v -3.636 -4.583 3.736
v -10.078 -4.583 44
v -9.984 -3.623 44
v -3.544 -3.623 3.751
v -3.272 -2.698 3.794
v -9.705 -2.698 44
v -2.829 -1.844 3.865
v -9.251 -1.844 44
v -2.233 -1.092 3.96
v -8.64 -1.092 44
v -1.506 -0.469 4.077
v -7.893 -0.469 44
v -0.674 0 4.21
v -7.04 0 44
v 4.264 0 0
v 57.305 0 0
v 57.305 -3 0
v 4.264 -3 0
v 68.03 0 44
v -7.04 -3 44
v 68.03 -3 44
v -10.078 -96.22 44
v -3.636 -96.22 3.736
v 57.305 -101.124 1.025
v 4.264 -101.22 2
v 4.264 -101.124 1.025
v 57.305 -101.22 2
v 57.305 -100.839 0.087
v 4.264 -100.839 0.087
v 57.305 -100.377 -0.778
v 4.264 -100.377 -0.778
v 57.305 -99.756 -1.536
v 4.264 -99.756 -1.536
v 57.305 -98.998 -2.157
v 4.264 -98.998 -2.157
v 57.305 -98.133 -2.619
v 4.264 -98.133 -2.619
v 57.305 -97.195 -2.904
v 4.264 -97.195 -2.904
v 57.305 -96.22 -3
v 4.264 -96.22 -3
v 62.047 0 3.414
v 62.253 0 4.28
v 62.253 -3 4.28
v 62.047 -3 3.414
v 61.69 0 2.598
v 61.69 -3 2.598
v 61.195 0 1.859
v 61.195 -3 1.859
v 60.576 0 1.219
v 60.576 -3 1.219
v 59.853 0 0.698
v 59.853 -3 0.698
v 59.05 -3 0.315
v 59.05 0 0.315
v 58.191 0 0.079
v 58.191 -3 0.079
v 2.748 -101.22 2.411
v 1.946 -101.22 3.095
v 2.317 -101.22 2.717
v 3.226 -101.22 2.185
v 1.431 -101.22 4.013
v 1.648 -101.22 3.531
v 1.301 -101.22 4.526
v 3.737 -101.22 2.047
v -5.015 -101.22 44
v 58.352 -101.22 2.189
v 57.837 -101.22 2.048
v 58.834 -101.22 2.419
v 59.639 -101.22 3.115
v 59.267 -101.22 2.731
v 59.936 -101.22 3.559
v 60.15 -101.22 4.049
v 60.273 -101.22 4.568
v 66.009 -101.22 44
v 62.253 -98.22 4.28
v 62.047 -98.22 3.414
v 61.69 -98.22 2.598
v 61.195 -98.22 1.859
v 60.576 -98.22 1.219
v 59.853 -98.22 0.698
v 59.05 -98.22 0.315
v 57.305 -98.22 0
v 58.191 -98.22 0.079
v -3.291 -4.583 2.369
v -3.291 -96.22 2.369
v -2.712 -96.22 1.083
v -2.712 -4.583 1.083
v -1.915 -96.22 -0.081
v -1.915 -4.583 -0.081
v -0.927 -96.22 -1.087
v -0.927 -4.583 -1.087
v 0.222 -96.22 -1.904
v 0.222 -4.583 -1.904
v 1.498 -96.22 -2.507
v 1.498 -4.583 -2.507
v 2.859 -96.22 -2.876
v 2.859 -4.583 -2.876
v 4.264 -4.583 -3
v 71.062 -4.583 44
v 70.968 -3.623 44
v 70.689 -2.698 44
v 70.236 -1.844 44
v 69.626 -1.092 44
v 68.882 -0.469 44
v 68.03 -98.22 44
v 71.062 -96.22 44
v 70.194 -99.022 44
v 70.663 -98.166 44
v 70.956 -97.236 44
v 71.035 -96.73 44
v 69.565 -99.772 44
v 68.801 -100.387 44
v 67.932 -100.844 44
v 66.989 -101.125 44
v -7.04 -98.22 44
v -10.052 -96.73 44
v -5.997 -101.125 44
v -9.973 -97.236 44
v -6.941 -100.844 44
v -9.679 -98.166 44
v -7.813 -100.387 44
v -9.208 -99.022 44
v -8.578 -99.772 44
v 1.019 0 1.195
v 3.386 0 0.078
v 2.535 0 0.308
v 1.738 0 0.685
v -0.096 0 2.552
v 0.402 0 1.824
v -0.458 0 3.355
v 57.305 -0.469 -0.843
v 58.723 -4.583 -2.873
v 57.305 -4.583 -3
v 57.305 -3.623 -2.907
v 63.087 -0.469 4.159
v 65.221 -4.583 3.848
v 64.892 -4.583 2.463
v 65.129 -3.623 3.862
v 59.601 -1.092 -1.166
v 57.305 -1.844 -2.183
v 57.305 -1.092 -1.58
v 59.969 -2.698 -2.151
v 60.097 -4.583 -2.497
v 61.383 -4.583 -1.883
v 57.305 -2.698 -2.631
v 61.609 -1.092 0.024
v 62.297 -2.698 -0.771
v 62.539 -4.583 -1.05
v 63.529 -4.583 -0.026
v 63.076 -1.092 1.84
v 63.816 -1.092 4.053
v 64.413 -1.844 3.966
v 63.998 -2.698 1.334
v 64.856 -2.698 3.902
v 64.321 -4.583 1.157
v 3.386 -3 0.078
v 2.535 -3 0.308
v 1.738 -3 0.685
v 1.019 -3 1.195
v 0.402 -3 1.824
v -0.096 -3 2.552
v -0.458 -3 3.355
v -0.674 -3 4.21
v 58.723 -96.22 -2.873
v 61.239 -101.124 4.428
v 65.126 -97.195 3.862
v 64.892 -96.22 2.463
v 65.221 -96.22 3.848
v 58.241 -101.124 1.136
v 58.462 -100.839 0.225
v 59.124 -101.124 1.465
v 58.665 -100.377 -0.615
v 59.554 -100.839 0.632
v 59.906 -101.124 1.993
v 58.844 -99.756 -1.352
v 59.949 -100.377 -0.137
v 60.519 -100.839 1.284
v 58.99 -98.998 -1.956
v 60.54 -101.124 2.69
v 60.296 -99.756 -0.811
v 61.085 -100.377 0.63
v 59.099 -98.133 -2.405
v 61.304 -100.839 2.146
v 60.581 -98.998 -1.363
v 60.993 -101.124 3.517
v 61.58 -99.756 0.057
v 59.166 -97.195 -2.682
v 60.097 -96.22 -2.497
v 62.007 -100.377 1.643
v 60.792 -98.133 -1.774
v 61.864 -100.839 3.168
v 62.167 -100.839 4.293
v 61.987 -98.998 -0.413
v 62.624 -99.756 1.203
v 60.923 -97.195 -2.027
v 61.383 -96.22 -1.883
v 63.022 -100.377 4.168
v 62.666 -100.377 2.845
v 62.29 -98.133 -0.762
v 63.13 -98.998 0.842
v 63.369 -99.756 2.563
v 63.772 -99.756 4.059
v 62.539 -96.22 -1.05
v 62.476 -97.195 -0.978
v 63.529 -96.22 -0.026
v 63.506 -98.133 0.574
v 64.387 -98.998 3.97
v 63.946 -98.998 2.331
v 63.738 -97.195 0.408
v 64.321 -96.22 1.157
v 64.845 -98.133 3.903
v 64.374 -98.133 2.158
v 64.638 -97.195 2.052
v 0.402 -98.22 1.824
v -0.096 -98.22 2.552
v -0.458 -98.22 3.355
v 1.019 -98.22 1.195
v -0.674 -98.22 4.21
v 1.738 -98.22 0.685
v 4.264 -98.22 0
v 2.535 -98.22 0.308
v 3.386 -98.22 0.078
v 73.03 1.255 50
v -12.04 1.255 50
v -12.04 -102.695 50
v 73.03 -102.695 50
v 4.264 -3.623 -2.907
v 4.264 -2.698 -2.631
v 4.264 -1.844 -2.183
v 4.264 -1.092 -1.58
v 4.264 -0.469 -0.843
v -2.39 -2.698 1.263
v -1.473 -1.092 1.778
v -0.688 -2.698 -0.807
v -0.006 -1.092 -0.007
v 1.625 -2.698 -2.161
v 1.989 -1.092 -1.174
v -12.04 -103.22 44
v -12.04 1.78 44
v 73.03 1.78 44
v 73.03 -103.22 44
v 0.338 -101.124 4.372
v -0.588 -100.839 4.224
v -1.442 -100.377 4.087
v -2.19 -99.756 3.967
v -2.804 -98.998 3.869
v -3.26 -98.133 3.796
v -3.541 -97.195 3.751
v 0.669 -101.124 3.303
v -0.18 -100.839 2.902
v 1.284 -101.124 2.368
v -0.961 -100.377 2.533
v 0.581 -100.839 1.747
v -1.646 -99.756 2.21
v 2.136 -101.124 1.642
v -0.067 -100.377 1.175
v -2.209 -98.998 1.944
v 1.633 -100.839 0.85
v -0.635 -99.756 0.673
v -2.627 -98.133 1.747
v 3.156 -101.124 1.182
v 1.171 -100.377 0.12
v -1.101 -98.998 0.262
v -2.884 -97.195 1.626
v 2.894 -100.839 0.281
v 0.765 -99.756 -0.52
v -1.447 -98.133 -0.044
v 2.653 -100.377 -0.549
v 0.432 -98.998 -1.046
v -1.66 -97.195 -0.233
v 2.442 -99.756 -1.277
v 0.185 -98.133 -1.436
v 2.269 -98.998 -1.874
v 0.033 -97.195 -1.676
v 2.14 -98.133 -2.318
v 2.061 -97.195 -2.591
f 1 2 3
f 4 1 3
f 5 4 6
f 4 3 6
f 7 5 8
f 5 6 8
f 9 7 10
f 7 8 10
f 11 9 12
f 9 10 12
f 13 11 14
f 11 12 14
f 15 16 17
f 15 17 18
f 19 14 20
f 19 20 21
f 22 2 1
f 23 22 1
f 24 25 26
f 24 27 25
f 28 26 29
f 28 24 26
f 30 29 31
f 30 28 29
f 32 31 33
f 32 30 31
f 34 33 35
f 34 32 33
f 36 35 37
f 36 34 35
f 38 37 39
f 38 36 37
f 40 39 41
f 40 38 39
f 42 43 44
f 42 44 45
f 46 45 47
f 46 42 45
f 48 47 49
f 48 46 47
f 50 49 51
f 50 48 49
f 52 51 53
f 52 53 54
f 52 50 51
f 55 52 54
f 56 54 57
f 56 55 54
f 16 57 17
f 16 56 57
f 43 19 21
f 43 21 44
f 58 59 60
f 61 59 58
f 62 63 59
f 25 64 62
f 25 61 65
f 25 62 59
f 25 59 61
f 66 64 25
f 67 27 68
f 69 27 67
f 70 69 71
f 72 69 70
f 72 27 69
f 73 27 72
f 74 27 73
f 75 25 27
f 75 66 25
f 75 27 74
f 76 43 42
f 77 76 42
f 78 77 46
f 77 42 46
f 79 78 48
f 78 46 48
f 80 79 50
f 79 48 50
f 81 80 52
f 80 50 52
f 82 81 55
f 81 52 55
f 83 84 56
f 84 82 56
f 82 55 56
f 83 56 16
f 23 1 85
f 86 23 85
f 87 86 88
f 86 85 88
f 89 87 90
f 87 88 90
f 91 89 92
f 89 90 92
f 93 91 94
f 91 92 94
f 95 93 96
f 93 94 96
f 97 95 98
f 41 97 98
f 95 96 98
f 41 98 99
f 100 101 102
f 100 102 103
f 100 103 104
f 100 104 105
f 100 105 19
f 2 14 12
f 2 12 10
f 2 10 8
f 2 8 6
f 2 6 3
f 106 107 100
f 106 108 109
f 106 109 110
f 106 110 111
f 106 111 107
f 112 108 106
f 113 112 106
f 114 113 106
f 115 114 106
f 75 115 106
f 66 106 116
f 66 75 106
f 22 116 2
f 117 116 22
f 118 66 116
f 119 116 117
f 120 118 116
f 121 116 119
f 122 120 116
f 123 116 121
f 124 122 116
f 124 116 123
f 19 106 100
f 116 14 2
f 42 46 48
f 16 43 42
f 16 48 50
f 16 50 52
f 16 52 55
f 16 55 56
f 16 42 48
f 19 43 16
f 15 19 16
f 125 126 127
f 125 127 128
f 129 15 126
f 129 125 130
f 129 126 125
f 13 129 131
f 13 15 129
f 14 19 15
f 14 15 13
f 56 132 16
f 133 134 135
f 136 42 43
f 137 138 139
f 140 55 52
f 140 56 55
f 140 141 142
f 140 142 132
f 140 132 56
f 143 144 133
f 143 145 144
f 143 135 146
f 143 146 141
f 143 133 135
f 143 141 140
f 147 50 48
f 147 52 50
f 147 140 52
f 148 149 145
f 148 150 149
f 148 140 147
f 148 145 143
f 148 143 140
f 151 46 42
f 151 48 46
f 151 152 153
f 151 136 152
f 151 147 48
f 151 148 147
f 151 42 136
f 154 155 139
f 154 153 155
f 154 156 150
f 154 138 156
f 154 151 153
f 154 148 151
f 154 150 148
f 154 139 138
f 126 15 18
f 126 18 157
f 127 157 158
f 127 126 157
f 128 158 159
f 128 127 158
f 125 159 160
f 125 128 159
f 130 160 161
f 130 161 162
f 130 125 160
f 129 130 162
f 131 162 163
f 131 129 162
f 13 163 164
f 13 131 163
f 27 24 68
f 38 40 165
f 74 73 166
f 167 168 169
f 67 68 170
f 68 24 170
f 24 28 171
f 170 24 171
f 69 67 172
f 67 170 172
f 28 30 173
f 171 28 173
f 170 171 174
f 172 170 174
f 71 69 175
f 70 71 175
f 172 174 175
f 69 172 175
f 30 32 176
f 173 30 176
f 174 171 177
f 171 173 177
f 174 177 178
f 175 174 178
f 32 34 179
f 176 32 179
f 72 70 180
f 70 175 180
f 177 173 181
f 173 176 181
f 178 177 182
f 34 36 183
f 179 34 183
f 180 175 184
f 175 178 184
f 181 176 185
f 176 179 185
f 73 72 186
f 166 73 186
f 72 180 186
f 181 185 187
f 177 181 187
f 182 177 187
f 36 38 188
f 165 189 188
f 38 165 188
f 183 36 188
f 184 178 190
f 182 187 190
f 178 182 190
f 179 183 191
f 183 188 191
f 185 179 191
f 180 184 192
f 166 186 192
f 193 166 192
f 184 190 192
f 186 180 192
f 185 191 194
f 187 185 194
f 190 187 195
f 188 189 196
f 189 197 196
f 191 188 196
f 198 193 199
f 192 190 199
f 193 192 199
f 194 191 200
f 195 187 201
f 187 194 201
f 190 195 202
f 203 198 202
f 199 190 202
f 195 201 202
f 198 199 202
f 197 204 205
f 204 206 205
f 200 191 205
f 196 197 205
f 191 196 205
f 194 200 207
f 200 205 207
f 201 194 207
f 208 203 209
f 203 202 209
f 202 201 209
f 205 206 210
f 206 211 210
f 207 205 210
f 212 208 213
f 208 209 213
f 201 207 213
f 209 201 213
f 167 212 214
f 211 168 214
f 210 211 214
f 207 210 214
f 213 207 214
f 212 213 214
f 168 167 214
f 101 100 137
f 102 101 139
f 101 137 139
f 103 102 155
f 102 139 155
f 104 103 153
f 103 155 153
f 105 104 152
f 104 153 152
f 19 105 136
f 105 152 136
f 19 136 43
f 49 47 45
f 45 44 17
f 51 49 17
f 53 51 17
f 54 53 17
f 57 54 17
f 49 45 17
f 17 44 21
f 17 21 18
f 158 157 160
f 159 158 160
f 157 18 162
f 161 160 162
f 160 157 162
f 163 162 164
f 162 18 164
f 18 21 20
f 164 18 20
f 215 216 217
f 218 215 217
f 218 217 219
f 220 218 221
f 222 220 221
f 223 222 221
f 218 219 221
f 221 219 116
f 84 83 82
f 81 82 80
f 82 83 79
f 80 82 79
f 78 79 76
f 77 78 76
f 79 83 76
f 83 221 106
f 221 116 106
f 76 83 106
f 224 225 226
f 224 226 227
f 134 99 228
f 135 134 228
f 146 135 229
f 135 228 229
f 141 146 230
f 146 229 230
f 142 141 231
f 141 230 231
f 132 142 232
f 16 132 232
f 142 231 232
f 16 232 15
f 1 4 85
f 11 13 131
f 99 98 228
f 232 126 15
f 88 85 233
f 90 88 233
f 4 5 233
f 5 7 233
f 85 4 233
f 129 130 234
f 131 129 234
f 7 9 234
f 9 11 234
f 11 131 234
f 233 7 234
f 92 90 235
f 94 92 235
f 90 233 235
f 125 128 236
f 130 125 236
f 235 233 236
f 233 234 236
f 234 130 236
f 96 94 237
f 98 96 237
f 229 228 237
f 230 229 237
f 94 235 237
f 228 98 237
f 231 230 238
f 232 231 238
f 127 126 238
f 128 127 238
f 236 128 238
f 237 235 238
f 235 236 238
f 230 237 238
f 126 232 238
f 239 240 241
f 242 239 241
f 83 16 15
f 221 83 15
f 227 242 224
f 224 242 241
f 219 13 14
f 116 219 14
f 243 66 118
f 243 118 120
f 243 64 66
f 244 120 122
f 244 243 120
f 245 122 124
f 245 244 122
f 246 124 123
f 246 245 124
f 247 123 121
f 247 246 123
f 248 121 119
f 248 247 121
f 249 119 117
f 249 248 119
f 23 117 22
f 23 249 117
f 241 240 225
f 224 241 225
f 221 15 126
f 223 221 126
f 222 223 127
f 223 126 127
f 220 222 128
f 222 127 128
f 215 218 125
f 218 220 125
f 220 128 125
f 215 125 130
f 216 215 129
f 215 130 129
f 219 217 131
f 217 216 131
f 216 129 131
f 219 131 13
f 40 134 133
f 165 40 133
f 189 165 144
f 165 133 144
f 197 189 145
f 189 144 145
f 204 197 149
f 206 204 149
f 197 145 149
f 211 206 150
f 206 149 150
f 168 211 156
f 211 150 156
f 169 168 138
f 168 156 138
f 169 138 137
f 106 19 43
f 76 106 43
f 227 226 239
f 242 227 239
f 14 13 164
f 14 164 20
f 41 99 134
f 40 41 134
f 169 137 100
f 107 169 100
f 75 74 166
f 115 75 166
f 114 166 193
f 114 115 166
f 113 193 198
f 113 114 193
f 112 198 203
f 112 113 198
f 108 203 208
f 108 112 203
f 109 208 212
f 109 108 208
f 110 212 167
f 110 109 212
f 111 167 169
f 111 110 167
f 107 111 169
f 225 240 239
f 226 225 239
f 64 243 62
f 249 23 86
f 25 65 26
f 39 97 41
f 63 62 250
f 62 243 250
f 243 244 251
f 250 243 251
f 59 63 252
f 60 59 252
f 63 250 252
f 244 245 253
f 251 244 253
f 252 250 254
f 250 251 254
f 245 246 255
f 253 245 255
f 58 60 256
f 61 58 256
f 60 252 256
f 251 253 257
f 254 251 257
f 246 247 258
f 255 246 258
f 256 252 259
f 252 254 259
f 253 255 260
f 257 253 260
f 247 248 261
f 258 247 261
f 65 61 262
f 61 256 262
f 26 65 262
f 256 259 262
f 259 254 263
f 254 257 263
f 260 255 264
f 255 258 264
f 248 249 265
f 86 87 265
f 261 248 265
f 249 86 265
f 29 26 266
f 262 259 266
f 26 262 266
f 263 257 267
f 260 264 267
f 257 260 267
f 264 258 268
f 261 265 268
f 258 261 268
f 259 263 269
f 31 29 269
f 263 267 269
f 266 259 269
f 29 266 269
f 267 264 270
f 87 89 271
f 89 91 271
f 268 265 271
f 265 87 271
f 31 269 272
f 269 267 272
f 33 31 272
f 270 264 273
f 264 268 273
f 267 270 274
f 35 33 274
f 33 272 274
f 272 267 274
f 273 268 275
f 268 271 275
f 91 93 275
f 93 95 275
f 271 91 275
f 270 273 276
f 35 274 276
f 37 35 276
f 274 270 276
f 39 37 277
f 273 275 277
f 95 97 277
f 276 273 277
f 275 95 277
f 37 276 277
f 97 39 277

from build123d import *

# Parameters (mm, degrees)
F1_DEPTH     = 101.22
F3_DEPTH     = 3
F5_DEPTH     = 3
F6_T1_DEPTH  = 52.0304782215
F6_T3_DEPTH  = 53.0410614462
F6_T5_DEPTH  = 52.232484609
F6_T8_ANGLE  = 81.7241071729
F6_T10_ANGLE = 80.9097230792
F7_R         = 5
F9_DEPTH     = 6
F11_DEPTH    = 111.14


# Not quite as in the source:
# - a fillet or chamfer that OpenCascade refuses, or shapes differently, is made with other operations: its cross-section is extruded or revolved along the edge and cut away or added


with BuildPart() as f1:
    # F0 (on Front) → F1 (new body)
    with BuildSketch(Plane.XZ):
        with BuildLine():
            Line((57.3046570067, 0), (4.2635955605, 0))
            ThreePointArc((4.2635955605, 0), (1.0193516214, 1.1954131284), (-0.6736075991, 4.2100474945))
            Line((-0.6736075991, 4.2100474945), (-7.04, 44))
            Line((-7.04, 44), (-10.0781573363, 44))
            Line((-10.0781573363, 44), (-3.6359294949, 3.7360759911))
            ThreePointArc((-3.6359294949, 3.7360759911), (-0.927194742, -1.0873389946), (4.2635955605, -3))
            Line((4.2635955605, -3), (57.3046570067, -3))
            ThreePointArc((57.3046570067, -3), (62.5385776153, -1.0502954525), (65.221348521, 3.8484812343))
            Line((65.221348521, 3.8484812343), (71.0615694323, 44))
            Line((71.0615694323, 44), (68.03, 44))
            Line((68.03, 44), (62.2525892031, 4.2803007714))
            ThreePointArc((62.2525892031, 4.2803007714), (60.5758573871, 1.2185653422), (57.3046570067, 0))
        make_face()
    extrude(amount=F1_DEPTH)

    # F2 (on face) → F3 (join)
    with BuildSketch(Plane.XZ.offset(101.22)):
        with BuildLine():
            Line((68.03, 44), (-7.04, 44))
            Line((-7.04, 44), (-0.6736075991, 4.2100474945))
            ThreePointArc((-0.6736075991, 4.2100474945), (1.0193516214, 1.1954131284), (4.2635955605, 0))
            Line((4.2635955605, 0), (57.3046570067, 0))
            ThreePointArc((57.3046570067, 0), (60.5758573871, 1.2185653422), (62.2525892031, 4.2803007714))
            Line((62.2525892031, 4.2803007714), (68.03, 44))
        make_face()
    extrude(amount=-F3_DEPTH)

    # F6: fillet of radius 5 on 1 edges, made by hand

    # F6_s2 → F6_t1 (cut)
    with BuildSketch(Plane(origin=(1.8994814012, 0, 13.0589346335), x_dir=(0, 1, 0), z_dir=(0.1439398457, 0, 0.9895864393))):
        with BuildLine():
            ThreePointArc((-4.582575695, -63.9882122531), (-1.8439629074, -63.1715123858), (0, -60.9882122531))
            Line((0, -60.9882122531), (0, -63.9882122531))
            Line((0, -63.9882122531), (-4.582575695, -63.9882122531))
        make_face()
    extrude(amount=F6_T1_DEPTH, mode=Mode.SUBTRACT)

    # F6_s4 → F6_t3 (cut)
    with BuildSketch(Plane.YZ.offset(4.2635955605)):
        with BuildLine():
            ThreePointArc((-4.582575695, -3), (-1.8439629074, -2.1833001327), (0, 0))
            Line((0, 0), (0, -3))
            Line((0, -3), (-4.582575695, -3))
        make_face()
    extrude(amount=F6_T3_DEPTH, mode=Mode.SUBTRACT)

    # F6_s6 → F6_t5 (cut)
    with BuildSketch(Plane(origin=(-8.9258440165, 0, 55.7865251034), x_dir=(0, 1, 0), z_dir=(0.1579905011, 0, -0.9874406319))):
        with BuildLine():
            ThreePointArc((-4.582575695, -3), (-1.8439629074, -2.1833001327), (0, 0))
            Line((0, 0), (0, -3))
            Line((0, -3), (-4.582575695, -3))
        make_face()
    extrude(amount=F6_T5_DEPTH, mode=Mode.SUBTRACT)

    # F6_s7 → F6_t8 (revolve, cut)
    with BuildSketch(Plane.YZ.offset(57.3046570067)):
        with BuildLine():
            ThreePointArc((0, 0), (-1.8439629074, -2.1833001327), (-4.582575695, -3))
            Line((-4.582575695, -3), (0, -3))
            Line((0, -3), (0, 0))
        make_face()
    revolve(axis=Axis((57.3046570067, 0, 5), (0, -1, 0)), revolution_arc=F6_T8_ANGLE, mode=Mode.SUBTRACT)

    # F6_s9 → F6_t10 (revolve, cut)
    with BuildSketch(Plane(origin=(-0.6736075991, 0, 4.2100474945), x_dir=(0, 1, 0), z_dir=(-0.1579905011, 0, 0.9874406319))):
        with BuildLine():
            ThreePointArc((-4.582575695, 3), (-1.8439629074, 2.1833001327), (0, 0))
            Line((0, 0), (0, 3))
            Line((0, 3), (-4.582575695, 3))
        make_face()
    revolve(axis=Axis((4.2635955605, 0, 5), (0, -1, 0)), revolution_arc=F6_T10_ANGLE, mode=Mode.SUBTRACT)

    # F7
    f7_edges = [f1.edges().sort_by_distance(p)[0] for p in [
        (-6.857043, -101.22, 23.868038),
        (68.141459, -101.22, 23.924241),
        (-0.927195, -101.22, -1.087339),
        (30.784126, -101.22, -3),
        (62.538578, -101.22, -1.050295),
    ]]
    fillet(f7_edges, radius=F7_R)


with BuildPart() as f5:
    # F4 (on face) → F5 (new body)
    with BuildSketch(Plane(origin=(0, 0, 0), x_dir=(-1, 0, 0), z_dir=(0, 1, 0))):
        with BuildLine():
            ThreePointArc((-4.2635955605, 0), (-1.0193516214, 1.1954131284), (0.6736075991, 4.2100474945))
            Line((0.6736075991, 4.2100474945), (7.04, 44))
            Line((7.04, 44), (-68.03, 44))
            Line((-68.03, 44), (-62.2525892031, 4.2803007714))
            ThreePointArc((-62.2525892031, 4.2803007714), (-60.5758573871, 1.2185653422), (-57.3046570067, 0))
            Line((-57.3046570067, 0), (-4.2635955605, 0))
        make_face()
    extrude(amount=-F5_DEPTH)


with BuildPart() as f9:
    # F8 (on face) → F9 (new body)
    with BuildSketch(Plane.XY.offset(44)):
        Polygon((-12.04, 1.78), (-12.04, -98.22), (-12.04, -103.22), (73.03, -103.22), (73.03, -98.22), (73.03, -3.22), (73.03, 1.78), align=None)
    extrude(amount=F9_DEPTH)

    # F10 (on face) → F11 (cut)
    with BuildSketch(Plane(origin=(-12.04, 0, 0), x_dir=(0, -1, 0), z_dir=(-1, 0, 0))):
        Polygon((102.6950680188, 50), (103.22, 44), (103.22, 50), align=None)
        Polygon((-1.78, 50), (-1.78, 44), (-1.2550680188, 50), align=None)
    extrude(amount=-F11_DEPTH, mode=Mode.SUBTRACT)


solid = Compound([f1.part, f5.part, f9.part])
